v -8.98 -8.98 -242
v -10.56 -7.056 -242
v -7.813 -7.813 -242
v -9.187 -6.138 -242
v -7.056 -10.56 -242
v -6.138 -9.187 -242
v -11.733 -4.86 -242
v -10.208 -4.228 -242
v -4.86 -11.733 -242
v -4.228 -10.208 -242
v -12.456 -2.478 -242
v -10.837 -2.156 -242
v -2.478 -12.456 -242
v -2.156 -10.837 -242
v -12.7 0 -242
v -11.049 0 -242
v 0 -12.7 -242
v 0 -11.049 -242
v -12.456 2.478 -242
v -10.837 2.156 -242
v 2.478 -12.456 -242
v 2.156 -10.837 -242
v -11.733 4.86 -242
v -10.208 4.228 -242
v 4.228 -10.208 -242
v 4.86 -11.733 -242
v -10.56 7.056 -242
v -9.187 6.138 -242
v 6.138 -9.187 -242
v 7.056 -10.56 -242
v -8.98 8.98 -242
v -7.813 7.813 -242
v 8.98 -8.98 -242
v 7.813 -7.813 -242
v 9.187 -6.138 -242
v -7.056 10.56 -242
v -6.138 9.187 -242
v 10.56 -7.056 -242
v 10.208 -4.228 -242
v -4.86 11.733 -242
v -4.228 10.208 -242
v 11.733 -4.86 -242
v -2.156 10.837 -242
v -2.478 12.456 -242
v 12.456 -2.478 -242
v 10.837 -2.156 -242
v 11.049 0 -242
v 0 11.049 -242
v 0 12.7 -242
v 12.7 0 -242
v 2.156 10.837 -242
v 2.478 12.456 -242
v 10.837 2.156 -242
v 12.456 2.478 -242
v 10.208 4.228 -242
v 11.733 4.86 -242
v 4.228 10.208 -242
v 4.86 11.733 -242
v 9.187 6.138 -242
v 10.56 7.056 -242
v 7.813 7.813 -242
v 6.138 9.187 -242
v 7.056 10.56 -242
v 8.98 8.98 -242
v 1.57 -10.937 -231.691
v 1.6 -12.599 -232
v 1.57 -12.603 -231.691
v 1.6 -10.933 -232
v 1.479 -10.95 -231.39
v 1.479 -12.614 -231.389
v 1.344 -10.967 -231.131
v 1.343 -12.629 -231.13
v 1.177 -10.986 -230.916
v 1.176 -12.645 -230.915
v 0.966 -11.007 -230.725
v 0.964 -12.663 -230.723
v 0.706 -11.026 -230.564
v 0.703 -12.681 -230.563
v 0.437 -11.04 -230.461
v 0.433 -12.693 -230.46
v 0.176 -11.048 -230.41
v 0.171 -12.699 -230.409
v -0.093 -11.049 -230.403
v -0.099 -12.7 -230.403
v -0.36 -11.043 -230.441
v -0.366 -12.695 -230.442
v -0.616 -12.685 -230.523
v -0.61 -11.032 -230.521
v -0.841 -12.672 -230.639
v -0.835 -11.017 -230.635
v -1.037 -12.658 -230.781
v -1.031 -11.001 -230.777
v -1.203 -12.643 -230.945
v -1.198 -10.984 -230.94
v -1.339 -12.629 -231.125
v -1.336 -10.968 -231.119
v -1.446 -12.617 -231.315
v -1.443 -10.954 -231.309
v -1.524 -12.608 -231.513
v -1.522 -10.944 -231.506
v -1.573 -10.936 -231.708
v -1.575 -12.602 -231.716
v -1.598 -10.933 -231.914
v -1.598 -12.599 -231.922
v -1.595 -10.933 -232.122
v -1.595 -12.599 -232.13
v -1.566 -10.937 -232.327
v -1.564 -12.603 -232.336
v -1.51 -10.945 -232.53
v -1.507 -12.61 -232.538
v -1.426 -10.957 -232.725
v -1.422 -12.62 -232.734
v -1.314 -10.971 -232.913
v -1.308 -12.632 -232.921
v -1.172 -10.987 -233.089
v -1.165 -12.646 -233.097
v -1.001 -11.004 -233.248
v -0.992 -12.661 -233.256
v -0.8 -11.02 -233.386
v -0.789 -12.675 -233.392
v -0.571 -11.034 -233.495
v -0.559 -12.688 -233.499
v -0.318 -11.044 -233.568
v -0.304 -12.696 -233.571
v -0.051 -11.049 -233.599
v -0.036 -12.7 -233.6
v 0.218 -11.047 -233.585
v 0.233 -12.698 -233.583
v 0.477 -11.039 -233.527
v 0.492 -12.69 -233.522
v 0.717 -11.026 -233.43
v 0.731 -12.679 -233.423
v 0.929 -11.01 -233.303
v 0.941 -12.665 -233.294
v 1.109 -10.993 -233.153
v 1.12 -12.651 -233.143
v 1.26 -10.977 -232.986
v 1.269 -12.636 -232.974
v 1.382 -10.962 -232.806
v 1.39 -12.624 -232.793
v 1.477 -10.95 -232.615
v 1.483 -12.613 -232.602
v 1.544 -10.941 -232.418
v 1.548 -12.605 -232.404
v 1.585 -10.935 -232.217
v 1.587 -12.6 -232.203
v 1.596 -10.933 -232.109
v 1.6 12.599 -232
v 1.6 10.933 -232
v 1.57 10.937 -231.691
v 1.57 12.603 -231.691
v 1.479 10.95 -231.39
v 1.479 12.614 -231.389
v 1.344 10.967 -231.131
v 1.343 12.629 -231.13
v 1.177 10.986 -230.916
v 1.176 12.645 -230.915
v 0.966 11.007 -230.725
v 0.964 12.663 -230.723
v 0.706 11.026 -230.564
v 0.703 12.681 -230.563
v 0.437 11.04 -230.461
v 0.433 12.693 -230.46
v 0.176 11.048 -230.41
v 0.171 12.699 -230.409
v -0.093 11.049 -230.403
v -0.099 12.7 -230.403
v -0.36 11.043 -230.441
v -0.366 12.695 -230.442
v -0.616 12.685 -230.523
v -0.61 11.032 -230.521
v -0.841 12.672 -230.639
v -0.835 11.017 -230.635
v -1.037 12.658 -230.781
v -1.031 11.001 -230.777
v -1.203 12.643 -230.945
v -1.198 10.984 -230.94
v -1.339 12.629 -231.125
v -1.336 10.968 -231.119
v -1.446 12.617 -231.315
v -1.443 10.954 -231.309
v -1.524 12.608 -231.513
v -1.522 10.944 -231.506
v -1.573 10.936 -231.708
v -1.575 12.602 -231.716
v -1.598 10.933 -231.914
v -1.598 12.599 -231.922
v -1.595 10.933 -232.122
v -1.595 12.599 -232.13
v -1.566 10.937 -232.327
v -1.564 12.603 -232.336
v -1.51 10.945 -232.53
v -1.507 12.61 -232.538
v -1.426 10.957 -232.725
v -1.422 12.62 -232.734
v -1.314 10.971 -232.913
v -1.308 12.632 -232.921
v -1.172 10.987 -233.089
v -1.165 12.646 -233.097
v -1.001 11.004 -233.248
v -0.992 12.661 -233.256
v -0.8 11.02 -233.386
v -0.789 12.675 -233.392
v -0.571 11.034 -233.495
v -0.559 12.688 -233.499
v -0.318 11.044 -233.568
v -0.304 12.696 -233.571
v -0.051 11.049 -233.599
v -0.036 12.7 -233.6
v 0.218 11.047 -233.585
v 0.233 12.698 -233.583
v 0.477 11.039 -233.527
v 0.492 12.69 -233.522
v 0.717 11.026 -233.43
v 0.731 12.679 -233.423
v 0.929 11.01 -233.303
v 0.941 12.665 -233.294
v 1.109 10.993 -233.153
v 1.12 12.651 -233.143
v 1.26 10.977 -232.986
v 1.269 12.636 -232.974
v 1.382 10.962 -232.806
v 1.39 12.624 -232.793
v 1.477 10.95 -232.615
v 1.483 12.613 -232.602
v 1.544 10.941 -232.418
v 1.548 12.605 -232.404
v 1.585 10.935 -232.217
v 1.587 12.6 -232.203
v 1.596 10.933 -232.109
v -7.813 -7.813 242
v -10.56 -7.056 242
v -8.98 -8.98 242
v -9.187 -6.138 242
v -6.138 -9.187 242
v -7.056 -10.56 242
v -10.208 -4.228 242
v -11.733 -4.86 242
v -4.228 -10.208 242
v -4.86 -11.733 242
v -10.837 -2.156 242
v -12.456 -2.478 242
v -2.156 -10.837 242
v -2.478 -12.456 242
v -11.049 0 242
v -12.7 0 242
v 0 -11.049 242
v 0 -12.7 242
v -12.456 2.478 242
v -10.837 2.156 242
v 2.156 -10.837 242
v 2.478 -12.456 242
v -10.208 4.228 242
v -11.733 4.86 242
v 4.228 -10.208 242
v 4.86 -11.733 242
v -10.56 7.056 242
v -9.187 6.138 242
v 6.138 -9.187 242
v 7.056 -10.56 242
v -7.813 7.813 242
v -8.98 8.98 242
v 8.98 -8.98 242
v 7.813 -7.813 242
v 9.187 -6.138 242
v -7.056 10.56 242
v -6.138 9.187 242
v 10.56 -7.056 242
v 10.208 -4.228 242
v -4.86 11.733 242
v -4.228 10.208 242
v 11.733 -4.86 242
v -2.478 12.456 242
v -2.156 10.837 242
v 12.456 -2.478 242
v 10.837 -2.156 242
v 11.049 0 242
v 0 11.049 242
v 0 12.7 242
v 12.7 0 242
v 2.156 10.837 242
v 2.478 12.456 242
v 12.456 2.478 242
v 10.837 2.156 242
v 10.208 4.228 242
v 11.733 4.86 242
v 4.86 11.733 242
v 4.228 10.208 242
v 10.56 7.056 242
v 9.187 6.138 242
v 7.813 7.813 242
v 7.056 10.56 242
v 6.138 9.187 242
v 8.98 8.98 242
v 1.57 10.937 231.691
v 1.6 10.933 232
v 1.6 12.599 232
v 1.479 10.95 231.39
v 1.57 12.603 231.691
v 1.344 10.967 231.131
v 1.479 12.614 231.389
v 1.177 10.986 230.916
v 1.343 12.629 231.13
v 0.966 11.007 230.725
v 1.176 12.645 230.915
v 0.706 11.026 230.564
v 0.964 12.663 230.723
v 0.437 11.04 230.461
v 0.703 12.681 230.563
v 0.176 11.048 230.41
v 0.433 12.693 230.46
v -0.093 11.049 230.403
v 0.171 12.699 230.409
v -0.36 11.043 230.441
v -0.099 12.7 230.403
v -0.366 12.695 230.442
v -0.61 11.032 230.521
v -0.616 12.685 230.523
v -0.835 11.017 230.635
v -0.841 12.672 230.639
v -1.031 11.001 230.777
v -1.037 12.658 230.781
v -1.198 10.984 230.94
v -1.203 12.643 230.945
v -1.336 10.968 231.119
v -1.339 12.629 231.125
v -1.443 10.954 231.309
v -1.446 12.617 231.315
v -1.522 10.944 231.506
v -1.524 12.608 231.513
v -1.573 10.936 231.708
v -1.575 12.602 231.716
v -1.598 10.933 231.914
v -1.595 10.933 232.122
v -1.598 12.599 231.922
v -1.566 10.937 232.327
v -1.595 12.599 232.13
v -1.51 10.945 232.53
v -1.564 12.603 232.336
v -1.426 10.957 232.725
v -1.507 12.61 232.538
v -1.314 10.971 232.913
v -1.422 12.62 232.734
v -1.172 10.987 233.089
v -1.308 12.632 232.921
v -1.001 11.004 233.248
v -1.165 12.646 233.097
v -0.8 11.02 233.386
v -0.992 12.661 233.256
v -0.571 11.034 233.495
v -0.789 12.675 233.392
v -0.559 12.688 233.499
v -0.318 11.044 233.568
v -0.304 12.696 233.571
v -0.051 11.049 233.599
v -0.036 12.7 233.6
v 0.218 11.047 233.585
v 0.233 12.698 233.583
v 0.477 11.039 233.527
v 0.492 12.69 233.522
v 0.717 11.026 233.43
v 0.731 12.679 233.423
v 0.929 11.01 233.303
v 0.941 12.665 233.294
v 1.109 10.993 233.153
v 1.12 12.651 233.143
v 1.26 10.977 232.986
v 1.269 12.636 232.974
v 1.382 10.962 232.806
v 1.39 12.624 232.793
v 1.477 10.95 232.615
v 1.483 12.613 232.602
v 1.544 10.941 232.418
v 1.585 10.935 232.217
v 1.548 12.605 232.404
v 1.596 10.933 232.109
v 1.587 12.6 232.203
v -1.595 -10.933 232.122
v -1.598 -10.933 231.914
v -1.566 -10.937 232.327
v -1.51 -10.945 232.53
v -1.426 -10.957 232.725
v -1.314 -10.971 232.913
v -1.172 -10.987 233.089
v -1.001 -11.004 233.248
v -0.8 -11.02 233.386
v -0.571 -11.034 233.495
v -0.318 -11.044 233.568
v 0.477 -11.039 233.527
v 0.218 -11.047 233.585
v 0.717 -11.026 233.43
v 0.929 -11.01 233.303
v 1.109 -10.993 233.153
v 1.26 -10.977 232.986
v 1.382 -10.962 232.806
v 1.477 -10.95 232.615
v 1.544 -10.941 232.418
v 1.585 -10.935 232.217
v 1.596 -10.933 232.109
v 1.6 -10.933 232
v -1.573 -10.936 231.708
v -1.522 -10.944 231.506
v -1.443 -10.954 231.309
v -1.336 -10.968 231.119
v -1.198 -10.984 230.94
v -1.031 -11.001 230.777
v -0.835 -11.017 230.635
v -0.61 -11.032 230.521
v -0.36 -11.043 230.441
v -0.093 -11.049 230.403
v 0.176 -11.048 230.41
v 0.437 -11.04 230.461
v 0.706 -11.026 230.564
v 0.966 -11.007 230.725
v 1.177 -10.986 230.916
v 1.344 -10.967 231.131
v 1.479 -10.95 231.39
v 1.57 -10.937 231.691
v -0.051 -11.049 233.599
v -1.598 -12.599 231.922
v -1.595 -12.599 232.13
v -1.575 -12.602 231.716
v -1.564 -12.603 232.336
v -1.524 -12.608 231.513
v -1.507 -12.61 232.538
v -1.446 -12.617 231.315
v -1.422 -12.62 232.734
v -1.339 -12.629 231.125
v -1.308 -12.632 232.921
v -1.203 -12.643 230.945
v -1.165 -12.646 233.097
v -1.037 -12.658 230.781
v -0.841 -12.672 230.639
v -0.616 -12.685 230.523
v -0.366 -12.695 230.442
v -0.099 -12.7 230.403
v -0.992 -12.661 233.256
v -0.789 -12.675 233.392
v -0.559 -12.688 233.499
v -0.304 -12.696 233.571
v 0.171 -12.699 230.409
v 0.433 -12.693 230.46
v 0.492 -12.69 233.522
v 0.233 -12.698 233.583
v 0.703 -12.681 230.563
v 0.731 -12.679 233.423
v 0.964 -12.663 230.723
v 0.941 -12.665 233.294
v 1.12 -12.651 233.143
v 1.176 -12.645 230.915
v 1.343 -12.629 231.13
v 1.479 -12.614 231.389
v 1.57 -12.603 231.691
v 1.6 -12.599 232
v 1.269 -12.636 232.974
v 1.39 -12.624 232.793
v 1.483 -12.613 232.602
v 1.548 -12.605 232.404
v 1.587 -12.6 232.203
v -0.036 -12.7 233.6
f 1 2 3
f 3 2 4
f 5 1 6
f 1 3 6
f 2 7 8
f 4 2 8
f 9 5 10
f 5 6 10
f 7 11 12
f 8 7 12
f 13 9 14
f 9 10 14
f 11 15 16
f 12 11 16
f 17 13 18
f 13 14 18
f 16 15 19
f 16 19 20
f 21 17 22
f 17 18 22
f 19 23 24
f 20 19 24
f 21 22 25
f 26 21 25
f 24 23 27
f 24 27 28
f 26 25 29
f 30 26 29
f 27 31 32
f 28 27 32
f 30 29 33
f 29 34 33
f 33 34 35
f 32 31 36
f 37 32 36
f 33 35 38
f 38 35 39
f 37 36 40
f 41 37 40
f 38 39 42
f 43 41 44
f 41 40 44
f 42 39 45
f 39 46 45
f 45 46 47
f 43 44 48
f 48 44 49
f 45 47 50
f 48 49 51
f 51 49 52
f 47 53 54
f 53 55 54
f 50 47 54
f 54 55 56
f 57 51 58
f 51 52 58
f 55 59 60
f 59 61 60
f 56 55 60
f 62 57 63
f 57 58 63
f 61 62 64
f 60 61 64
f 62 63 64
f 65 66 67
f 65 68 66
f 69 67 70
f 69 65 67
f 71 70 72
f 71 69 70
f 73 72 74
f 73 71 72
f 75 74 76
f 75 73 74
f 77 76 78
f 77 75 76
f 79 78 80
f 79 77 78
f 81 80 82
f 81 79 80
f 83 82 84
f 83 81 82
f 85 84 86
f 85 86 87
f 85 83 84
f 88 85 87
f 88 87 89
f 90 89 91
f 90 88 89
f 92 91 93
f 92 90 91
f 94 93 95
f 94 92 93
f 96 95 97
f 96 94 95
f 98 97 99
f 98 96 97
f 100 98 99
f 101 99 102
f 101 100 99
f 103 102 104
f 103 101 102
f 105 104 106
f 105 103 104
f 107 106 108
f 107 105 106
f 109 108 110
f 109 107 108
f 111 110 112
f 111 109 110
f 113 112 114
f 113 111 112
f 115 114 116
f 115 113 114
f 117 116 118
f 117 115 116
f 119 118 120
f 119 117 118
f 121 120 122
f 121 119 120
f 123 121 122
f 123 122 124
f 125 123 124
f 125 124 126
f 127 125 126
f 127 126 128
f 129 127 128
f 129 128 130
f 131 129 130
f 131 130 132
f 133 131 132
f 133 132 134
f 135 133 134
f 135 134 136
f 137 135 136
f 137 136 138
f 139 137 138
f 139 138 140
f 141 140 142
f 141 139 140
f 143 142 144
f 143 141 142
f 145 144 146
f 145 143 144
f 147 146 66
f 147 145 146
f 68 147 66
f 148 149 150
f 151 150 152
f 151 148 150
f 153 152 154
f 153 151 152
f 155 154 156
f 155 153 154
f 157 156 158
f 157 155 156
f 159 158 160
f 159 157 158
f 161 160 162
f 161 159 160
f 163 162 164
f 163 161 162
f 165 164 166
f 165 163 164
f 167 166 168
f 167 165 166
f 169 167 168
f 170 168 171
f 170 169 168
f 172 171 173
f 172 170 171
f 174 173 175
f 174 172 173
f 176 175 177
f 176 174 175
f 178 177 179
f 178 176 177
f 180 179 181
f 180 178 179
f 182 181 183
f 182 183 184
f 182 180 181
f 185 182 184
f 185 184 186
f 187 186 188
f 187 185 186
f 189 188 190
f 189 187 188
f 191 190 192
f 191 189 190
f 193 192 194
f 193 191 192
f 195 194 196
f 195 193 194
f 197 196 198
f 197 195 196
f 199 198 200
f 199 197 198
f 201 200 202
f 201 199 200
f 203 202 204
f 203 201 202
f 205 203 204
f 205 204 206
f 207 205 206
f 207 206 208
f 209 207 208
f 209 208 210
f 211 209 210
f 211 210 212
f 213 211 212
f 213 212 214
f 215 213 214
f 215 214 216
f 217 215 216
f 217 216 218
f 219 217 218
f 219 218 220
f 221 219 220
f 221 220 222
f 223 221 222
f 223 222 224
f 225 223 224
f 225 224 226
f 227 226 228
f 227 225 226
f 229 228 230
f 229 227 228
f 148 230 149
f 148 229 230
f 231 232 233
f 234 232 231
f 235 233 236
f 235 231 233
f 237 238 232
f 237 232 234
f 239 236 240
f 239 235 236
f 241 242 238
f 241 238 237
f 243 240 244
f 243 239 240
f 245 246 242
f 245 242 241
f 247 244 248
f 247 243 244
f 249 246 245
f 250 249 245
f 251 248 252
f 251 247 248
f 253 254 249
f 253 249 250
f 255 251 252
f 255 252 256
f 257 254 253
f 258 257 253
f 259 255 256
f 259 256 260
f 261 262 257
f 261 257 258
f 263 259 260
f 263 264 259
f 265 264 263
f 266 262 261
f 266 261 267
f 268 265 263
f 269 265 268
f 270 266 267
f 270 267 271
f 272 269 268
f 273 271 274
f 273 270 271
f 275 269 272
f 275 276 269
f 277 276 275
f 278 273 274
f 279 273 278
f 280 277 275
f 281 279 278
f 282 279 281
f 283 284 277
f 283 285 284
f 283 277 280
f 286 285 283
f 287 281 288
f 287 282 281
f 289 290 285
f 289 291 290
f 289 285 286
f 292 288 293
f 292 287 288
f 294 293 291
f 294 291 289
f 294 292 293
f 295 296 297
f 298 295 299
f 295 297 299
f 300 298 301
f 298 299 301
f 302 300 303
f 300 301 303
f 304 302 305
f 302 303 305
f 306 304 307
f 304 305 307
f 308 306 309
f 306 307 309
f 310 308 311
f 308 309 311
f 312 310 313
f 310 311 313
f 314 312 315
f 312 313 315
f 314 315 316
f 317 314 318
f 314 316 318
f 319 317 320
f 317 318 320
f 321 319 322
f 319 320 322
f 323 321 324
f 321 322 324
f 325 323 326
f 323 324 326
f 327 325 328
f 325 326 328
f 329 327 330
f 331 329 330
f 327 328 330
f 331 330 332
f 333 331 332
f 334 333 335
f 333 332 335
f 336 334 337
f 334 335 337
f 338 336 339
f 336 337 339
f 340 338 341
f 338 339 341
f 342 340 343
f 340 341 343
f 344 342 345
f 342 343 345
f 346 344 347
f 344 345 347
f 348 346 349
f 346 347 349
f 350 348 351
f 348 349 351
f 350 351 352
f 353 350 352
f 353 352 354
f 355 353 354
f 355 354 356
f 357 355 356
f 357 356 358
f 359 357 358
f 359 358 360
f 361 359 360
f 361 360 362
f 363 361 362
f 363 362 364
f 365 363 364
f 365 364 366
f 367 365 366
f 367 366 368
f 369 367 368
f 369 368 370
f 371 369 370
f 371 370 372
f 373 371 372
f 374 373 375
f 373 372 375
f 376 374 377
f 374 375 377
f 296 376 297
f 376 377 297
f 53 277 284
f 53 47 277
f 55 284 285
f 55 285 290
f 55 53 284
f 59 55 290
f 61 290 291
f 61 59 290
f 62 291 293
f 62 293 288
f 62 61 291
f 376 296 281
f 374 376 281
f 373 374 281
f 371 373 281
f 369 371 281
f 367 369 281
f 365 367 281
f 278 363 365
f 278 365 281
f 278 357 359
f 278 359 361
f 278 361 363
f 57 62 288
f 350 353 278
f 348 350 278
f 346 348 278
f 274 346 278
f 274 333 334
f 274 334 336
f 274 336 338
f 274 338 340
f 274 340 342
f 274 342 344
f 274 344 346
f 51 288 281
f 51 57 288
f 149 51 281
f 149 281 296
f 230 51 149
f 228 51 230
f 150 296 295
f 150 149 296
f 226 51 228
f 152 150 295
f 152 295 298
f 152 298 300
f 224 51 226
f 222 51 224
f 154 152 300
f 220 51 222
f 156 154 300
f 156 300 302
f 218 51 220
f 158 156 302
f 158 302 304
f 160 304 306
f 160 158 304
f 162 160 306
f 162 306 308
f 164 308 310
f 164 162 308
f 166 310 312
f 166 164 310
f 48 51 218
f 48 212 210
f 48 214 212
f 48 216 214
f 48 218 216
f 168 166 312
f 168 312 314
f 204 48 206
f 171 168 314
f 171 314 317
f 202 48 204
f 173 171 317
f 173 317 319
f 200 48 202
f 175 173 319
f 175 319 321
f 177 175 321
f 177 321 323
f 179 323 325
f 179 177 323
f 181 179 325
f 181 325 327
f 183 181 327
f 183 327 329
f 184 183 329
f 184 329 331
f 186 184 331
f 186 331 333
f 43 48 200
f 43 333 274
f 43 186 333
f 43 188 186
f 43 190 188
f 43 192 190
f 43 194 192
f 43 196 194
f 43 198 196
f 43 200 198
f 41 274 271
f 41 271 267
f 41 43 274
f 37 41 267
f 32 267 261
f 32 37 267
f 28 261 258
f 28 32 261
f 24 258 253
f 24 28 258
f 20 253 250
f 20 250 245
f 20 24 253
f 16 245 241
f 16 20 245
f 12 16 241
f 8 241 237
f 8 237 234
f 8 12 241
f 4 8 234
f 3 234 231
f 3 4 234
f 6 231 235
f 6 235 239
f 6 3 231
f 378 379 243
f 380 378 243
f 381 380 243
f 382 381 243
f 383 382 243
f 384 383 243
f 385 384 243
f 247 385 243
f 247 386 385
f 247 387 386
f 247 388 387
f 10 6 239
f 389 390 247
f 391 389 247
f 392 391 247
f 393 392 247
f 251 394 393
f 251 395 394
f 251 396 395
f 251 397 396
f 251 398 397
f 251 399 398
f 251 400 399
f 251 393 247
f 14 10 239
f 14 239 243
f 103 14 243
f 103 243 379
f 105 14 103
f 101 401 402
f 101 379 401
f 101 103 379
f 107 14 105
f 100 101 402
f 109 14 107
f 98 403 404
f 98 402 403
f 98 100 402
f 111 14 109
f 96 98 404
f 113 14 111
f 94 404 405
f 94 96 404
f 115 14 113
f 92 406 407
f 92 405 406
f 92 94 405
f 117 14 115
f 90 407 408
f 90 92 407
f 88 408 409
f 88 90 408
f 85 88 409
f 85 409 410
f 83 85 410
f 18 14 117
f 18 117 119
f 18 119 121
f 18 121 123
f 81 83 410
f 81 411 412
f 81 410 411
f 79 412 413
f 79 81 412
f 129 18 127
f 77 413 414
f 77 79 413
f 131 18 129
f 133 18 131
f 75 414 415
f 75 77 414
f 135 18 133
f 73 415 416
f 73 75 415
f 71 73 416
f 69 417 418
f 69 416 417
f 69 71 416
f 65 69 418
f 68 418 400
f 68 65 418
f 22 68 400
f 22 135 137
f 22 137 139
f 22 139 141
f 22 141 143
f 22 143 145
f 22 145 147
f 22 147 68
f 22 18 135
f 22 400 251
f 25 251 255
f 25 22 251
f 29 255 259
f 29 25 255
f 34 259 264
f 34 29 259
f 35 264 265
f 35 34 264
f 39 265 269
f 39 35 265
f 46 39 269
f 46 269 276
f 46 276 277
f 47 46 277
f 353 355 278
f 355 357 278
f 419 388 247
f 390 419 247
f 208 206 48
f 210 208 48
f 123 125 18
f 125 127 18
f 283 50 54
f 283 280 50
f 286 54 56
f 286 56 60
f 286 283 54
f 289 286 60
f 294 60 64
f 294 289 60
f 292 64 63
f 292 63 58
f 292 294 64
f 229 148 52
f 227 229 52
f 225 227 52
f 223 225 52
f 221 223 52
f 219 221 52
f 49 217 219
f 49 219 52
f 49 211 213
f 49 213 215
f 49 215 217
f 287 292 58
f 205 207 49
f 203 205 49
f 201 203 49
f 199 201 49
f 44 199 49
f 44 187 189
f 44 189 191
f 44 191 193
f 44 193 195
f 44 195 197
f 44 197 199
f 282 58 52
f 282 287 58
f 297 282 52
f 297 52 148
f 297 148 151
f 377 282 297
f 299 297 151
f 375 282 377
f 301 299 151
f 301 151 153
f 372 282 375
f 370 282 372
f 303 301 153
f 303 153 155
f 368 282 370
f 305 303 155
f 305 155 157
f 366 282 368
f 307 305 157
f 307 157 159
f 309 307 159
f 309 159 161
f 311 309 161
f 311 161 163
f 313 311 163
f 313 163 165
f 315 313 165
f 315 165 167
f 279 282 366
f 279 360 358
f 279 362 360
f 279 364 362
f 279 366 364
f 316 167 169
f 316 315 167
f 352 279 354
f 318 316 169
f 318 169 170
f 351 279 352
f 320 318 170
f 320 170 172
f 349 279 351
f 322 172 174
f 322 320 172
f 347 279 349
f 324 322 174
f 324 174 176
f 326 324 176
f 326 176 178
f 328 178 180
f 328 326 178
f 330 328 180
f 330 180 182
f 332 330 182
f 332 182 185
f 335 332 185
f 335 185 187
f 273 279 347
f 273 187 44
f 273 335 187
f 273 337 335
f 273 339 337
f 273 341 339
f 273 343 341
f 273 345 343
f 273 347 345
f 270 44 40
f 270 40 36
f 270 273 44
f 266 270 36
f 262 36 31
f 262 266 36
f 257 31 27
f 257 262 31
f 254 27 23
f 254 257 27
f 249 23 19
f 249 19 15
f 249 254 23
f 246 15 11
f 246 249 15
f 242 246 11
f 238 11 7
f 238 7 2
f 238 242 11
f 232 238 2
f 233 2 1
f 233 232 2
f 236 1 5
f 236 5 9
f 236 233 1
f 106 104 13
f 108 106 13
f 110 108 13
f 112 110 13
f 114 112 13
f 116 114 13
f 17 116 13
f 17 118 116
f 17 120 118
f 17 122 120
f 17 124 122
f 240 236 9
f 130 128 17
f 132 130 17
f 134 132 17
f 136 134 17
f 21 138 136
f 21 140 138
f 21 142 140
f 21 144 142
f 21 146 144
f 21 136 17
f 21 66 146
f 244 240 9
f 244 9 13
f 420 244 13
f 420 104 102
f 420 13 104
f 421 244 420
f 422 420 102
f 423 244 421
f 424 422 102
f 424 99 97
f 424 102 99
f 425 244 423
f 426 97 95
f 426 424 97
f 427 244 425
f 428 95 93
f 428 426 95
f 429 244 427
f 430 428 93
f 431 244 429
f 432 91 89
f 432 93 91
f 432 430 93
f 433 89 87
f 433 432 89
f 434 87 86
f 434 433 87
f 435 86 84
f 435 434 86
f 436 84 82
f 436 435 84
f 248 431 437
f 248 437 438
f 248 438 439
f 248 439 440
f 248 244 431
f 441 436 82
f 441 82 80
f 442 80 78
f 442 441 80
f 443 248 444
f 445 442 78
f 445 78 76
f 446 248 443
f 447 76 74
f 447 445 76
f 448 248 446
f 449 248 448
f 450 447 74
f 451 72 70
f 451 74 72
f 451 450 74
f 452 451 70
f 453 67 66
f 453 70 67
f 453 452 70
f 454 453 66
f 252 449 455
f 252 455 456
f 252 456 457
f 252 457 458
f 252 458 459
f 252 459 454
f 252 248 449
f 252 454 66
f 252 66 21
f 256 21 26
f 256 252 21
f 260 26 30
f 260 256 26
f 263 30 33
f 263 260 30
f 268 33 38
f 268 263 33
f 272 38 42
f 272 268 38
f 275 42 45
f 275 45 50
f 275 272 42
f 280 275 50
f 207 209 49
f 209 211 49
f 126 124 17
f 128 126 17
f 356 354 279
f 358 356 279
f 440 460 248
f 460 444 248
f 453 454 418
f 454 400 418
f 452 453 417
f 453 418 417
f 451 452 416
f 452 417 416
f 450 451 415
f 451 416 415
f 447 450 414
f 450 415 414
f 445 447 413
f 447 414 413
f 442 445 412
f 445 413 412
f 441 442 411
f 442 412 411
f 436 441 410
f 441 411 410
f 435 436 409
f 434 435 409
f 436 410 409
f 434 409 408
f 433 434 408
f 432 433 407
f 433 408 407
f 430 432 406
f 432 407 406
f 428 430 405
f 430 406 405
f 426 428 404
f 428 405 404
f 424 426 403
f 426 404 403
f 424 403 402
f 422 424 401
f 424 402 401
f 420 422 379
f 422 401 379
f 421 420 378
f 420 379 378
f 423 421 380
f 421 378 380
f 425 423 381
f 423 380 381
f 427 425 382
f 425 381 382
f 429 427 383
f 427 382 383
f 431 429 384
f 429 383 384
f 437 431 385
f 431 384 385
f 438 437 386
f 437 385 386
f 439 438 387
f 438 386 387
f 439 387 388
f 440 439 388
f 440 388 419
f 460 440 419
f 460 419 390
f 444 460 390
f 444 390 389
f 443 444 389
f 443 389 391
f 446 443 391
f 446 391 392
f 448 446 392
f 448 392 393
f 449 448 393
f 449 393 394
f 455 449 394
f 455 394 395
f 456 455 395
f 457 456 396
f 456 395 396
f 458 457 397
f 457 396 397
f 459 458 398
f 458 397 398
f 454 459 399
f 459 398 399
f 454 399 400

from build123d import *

# Parameters (mm, degrees)
SKETCH1_R           = 12.7
SKETCH1_R_2         = 11.049
BOSS_EXTRUDE1_DEPTH = 242
SKETCH2_R           = 1.6
CUT_EXTRUDE1_DEPTH  = 13.7


with BuildPart() as part:
    # Sketch1 → Boss-Extrude1 (new body, symmetric)
    with BuildSketch(Plane.XY):
        Circle(SKETCH1_R)
        Circle(SKETCH1_R_2, mode=Mode.SUBTRACT)
    extrude(amount=BOSS_EXTRUDE1_DEPTH, both=True)

    # Sketch2 → Cut-Extrude1 (cut, symmetric)
    with BuildSketch(Plane(origin=(0, 0, 0), x_dir=(1, 0, 0), z_dir=(0, 1, 0))):
        with Locations((0, -232)):
            Circle(SKETCH2_R)
    cut_extrude1 = extrude(amount=CUT_EXTRUDE1_DEPTH, both=True, mode=Mode.SUBTRACT)

    # Mirror1: Cut-Extrude1 across plane
    add(cut_extrude1.mirror(Plane.XY), mode=Mode.SUBTRACT)


solid = part.part
